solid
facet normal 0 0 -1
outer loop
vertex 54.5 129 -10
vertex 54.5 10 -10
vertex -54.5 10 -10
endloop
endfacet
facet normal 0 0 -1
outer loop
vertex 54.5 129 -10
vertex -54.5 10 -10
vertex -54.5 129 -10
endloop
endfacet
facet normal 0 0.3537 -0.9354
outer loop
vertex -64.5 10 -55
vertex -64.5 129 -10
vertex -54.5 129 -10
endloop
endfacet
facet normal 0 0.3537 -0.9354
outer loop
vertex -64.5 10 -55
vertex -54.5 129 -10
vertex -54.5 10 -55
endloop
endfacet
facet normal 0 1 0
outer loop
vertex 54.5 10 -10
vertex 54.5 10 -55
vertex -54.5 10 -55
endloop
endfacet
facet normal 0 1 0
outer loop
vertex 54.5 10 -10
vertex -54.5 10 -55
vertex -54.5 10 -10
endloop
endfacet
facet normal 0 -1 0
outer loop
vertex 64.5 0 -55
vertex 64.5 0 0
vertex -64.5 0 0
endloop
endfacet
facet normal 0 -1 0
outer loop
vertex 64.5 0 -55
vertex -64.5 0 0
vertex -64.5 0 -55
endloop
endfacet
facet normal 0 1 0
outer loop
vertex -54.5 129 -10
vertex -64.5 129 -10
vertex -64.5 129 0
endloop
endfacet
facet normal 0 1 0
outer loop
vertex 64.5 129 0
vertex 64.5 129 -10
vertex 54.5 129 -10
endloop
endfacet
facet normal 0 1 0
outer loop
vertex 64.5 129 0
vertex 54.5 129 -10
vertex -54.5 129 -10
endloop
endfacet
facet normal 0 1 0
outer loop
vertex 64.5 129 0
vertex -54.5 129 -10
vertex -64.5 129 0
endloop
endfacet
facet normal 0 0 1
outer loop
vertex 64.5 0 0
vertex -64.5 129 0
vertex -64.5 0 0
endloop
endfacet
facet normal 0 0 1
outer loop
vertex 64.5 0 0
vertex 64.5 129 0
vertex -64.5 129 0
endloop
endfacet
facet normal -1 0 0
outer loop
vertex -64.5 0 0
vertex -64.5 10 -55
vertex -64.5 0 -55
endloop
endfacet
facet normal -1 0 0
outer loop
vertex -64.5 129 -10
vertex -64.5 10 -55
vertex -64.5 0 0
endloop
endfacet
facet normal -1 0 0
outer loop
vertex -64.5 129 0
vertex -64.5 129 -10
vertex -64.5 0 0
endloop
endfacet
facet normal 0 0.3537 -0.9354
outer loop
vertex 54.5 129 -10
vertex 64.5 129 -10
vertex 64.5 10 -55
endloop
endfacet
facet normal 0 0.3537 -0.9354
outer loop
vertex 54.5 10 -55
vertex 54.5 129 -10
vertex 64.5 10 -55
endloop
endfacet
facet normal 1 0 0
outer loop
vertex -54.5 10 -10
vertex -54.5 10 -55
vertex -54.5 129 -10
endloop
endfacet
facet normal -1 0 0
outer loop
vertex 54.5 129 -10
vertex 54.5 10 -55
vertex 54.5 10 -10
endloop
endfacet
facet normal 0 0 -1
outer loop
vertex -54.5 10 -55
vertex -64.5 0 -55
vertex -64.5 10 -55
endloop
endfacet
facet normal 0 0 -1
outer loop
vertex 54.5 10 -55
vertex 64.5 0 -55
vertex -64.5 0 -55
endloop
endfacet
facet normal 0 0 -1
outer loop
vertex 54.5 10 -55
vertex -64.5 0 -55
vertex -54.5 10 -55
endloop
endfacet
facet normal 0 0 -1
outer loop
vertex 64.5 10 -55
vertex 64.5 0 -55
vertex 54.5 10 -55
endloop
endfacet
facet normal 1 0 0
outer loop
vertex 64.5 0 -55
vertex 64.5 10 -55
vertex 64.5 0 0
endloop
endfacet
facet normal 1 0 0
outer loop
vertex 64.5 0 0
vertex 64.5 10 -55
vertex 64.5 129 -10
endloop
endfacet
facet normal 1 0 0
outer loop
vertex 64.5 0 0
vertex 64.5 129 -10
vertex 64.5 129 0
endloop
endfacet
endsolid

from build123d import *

# Parameters (mm, degrees)
EXTRUDE_THIN1_DEPTH = 64.5
EXTRUDE1_DEPTH      = 10


with BuildPart() as part:
    # Sketch1 → Extrude-Thin1 (new body, symmetric)
    with BuildSketch(Plane(origin=(0, 0, 0), x_dir=(0, 0, -1), z_dir=(1, 0, 0))):
        Polygon((0, 129), (0, 0), (55, 0), (55, 10), (10, 10), (10, 129), align=None)
    extrude(amount=EXTRUDE_THIN1_DEPTH, both=True)

    # Sketch2 → Extrude1 (add)
    with BuildSketch(Plane(origin=(64.5, 0, 0), x_dir=(0, 0, -1), z_dir=(1, 0, 0))):
        Polygon((10, 129), (55, 10), (10, 10), align=None)
    extrude1 = extrude(amount=-EXTRUDE1_DEPTH)

    # Mirror1: Extrude1 across plane
    add(extrude1.mirror(Plane(origin=(0, 0, 0), x_dir=(0, 0, 1), z_dir=(1, 0, 0))))


solid = part.part
